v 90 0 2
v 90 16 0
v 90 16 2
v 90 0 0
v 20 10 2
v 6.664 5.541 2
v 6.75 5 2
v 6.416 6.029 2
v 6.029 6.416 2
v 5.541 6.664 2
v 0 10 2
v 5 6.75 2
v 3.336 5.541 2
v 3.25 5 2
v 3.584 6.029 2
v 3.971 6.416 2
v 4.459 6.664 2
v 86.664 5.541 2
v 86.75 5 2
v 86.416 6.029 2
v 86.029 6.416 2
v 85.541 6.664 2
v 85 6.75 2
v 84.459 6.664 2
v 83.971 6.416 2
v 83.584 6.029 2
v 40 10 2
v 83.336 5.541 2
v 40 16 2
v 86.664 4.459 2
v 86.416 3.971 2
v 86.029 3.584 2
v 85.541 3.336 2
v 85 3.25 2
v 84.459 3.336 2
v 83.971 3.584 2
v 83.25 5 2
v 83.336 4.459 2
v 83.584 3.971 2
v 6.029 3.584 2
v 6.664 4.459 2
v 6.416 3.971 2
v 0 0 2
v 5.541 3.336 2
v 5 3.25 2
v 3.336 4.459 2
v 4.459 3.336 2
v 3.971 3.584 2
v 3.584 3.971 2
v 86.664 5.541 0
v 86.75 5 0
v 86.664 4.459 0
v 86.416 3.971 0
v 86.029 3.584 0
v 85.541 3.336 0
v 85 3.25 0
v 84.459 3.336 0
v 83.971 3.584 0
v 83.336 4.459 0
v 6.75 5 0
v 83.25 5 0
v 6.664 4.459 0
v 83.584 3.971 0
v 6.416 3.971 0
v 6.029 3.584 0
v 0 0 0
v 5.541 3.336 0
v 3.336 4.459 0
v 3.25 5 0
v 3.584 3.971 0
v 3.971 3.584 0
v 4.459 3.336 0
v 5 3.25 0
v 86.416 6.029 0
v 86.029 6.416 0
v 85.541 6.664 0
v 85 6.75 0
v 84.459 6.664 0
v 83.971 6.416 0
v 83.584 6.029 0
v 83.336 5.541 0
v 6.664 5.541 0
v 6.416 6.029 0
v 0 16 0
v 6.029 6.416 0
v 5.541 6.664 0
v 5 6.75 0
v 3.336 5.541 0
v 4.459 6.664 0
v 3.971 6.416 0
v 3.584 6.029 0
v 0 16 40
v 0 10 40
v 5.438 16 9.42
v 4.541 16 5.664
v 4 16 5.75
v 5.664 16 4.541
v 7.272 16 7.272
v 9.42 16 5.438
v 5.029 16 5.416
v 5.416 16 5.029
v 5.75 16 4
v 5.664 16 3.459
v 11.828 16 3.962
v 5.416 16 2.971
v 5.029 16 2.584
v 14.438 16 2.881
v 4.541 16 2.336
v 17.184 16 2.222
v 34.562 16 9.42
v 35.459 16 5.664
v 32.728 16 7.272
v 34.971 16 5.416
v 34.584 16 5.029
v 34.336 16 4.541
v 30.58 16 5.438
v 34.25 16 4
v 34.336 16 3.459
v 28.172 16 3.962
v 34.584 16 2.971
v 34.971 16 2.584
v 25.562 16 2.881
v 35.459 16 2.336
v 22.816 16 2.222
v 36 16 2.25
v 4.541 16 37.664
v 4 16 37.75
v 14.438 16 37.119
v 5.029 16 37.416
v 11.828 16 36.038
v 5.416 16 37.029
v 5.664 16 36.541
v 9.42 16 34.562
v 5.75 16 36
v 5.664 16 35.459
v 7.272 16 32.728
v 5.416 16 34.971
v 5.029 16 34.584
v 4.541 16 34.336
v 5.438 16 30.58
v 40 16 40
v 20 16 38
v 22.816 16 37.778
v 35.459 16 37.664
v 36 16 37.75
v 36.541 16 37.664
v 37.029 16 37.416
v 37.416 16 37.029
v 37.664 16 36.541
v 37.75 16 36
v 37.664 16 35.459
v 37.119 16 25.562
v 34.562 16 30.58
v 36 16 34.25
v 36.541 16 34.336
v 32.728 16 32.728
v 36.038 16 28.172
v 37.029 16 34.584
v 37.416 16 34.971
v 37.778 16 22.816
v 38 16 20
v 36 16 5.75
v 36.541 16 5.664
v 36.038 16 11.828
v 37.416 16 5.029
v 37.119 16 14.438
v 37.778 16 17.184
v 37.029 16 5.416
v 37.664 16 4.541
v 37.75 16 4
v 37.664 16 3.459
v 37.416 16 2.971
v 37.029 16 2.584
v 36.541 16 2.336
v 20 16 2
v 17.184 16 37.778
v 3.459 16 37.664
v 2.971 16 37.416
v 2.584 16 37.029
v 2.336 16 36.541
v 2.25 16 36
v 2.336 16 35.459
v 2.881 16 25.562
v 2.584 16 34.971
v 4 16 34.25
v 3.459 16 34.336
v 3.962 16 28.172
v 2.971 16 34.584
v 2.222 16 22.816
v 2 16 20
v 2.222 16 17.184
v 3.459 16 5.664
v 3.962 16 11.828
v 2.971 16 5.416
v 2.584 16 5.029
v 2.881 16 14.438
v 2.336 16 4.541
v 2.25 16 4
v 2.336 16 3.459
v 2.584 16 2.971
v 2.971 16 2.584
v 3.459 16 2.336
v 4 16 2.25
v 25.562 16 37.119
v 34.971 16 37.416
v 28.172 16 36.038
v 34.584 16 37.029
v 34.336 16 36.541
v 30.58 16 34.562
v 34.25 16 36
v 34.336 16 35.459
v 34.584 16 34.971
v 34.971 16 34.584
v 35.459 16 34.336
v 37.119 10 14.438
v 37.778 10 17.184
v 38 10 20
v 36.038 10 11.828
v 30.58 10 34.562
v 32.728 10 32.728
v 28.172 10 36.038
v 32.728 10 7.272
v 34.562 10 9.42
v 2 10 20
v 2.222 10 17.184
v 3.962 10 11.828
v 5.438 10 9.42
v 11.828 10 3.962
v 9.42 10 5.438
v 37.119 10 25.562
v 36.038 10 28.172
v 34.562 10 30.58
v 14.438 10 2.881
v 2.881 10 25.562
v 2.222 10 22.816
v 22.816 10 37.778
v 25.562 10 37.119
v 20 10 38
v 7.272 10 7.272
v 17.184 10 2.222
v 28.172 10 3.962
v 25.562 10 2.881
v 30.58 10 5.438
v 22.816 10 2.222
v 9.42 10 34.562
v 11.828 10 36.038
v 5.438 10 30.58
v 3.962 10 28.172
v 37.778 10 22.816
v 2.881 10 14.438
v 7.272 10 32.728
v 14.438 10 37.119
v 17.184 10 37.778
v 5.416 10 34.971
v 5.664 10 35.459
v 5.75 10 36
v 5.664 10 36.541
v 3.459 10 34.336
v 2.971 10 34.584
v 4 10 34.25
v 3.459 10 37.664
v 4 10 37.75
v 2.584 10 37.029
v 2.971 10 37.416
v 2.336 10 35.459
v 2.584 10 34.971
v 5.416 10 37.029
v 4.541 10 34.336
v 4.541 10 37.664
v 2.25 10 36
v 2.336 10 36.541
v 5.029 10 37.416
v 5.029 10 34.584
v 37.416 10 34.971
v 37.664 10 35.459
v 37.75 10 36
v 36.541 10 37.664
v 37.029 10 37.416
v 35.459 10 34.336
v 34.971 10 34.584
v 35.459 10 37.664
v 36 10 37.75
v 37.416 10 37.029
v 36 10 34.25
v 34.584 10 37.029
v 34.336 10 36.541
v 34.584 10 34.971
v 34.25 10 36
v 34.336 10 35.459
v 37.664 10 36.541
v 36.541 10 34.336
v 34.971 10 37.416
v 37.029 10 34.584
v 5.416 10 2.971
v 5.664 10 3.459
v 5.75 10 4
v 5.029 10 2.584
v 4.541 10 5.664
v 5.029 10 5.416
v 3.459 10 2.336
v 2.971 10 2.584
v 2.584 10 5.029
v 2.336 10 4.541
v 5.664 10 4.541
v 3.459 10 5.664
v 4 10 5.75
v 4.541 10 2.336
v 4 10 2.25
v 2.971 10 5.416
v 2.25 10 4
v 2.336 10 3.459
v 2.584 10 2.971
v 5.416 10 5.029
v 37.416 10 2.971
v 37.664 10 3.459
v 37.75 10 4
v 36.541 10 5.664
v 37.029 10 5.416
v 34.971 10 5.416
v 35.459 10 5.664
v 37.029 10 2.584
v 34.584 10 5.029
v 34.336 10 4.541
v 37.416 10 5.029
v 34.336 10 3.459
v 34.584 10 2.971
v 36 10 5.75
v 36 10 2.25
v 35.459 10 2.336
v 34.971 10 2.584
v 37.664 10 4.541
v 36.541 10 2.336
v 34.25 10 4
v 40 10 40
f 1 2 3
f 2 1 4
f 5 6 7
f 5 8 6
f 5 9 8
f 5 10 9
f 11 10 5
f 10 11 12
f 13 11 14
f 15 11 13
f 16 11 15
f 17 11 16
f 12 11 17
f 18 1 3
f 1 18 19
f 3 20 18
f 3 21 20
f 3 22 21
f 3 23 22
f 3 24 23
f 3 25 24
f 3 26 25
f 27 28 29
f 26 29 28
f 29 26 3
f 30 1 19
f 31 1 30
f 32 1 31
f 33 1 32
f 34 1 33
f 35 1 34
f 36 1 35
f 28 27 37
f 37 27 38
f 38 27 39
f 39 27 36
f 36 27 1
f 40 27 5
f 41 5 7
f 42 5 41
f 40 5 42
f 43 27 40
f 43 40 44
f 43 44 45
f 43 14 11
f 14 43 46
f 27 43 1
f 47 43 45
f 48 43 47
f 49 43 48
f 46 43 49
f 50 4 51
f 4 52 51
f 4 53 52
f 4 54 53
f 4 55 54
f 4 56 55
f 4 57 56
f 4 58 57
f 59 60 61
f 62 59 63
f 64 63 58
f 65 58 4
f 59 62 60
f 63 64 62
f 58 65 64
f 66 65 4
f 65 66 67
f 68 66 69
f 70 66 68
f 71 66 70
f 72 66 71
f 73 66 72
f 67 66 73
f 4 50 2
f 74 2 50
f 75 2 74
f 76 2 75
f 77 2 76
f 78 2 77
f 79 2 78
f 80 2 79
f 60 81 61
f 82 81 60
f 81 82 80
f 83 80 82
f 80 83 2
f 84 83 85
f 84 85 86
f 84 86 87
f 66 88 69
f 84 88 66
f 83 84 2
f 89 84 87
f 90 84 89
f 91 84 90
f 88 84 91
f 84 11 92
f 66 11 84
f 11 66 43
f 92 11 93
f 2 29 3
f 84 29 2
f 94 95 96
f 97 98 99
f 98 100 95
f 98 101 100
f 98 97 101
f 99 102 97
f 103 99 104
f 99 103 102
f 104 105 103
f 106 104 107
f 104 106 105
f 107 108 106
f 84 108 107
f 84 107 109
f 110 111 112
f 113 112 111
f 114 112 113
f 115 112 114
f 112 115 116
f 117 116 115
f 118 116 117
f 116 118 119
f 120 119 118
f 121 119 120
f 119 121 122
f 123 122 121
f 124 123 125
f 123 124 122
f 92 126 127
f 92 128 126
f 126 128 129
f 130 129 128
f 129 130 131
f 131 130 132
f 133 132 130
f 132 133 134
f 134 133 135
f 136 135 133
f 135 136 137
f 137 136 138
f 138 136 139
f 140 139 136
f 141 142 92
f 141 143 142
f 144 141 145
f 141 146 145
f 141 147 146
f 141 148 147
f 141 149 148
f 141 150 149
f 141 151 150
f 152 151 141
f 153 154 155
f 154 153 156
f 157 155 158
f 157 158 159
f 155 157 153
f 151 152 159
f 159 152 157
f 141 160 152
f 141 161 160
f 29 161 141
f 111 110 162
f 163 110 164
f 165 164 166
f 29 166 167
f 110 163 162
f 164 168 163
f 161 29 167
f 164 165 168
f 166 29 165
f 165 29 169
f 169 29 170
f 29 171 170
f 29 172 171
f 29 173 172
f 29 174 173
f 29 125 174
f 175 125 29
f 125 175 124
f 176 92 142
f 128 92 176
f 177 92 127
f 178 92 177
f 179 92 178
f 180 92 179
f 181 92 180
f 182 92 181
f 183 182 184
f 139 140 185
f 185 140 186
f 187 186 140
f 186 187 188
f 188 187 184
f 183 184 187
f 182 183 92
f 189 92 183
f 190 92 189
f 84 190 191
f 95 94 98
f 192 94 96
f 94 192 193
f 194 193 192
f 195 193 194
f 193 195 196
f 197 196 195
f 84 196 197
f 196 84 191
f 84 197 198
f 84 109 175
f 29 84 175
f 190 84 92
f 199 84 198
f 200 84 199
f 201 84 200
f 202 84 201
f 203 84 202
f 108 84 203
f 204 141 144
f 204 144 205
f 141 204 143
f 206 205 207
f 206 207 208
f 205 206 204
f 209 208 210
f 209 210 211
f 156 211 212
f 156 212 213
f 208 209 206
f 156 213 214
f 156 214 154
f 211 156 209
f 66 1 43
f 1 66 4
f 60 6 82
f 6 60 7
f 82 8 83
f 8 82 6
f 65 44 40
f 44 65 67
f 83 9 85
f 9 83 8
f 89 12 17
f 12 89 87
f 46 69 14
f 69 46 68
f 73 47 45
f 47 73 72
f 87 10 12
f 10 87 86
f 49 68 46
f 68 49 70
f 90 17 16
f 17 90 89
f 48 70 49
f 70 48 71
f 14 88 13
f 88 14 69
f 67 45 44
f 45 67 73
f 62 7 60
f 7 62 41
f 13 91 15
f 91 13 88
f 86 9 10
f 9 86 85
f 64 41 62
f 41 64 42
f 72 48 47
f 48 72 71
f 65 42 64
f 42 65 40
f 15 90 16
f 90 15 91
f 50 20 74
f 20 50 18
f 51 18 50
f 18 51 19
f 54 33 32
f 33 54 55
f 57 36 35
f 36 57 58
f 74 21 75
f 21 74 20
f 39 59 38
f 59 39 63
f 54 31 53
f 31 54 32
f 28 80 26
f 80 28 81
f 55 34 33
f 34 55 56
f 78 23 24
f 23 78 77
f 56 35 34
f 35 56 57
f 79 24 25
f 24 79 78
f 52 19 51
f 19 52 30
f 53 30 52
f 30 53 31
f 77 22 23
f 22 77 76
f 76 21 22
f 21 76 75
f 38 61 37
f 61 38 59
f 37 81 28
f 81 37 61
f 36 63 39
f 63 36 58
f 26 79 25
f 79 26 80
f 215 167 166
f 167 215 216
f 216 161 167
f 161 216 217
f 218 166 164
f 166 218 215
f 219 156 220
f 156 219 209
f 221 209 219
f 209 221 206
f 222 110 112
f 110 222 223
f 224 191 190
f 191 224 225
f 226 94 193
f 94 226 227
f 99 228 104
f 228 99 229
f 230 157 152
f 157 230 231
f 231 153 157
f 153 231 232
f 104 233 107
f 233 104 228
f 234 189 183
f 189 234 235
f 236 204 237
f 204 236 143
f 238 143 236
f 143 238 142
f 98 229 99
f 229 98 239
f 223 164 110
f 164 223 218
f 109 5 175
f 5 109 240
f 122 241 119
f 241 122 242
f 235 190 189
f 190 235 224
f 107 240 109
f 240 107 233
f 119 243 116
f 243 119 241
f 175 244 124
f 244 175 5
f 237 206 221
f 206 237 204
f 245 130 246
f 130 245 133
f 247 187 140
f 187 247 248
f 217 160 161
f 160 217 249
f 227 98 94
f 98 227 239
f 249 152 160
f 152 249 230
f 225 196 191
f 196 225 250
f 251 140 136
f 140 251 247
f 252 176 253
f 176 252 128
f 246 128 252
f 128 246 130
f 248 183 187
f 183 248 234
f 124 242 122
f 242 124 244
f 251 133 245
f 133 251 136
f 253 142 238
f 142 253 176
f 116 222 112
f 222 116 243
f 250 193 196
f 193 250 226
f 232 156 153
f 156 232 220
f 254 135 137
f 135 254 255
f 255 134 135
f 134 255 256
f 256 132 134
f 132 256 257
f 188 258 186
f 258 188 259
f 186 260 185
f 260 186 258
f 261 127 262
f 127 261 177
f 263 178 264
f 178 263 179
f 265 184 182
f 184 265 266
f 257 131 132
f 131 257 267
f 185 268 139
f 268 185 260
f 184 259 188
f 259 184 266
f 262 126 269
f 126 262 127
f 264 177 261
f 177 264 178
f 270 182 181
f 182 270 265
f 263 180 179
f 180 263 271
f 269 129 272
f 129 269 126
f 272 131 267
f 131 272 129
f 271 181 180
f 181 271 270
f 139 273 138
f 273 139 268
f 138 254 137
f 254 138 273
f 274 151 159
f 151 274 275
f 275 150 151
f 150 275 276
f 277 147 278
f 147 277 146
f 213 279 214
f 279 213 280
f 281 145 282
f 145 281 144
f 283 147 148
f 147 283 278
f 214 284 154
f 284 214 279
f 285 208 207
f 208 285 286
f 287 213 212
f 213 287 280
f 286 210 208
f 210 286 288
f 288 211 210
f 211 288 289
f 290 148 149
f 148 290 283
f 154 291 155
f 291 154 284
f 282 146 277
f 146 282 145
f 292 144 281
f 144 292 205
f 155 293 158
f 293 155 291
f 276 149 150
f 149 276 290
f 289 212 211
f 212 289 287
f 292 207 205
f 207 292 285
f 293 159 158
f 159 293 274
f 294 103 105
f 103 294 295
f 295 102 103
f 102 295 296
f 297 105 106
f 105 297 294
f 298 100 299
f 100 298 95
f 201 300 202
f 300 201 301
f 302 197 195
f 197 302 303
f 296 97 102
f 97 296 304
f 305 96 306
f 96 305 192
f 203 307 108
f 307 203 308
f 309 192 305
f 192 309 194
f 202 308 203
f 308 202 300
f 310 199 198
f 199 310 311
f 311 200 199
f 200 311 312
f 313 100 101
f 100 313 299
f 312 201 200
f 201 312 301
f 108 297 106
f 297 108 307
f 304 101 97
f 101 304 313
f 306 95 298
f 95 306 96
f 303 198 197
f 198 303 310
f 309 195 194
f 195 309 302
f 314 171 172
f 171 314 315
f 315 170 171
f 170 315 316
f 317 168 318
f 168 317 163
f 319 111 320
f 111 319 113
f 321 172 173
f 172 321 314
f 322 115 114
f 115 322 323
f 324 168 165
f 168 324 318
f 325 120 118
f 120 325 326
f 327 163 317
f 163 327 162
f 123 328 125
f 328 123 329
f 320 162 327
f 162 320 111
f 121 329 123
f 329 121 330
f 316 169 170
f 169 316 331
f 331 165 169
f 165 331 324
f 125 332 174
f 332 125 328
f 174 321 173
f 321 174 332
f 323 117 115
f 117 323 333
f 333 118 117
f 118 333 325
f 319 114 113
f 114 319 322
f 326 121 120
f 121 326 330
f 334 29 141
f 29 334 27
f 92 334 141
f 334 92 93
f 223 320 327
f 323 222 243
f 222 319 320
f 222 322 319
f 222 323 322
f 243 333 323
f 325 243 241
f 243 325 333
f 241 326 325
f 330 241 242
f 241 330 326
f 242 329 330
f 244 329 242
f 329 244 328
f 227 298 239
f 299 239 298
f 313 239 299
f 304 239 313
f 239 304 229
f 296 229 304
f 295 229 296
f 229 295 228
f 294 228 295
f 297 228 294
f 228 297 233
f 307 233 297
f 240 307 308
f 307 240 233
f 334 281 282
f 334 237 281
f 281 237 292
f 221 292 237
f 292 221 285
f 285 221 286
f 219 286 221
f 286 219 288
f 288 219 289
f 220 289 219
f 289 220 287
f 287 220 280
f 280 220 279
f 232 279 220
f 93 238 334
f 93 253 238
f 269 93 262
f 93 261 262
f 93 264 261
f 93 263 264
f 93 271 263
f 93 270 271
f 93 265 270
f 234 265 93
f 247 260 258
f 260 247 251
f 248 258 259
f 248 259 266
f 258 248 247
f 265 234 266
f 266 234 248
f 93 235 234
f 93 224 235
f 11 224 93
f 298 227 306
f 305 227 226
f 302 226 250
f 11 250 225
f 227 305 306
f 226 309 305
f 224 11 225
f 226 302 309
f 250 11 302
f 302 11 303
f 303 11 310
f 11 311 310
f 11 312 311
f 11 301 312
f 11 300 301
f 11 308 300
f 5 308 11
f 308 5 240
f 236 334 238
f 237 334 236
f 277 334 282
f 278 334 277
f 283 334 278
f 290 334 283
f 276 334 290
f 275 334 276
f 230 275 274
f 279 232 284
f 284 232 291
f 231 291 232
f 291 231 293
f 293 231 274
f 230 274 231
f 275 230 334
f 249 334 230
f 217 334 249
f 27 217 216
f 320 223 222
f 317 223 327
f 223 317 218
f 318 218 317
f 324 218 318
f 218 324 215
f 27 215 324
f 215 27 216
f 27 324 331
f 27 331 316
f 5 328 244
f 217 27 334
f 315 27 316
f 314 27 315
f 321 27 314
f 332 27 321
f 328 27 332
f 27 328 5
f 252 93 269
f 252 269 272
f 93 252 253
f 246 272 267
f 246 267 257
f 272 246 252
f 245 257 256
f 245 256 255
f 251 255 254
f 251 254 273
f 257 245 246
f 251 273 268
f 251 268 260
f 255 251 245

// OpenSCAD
difference(){
  cube([90,16,2]);
  translate([5,5,-.01]) cylinder(d=3.5,h=3,$fn=20);
  translate([85,5,-.01]) cylinder(d=3.5,h=3,$fn=20);
}
translate([0,10]) {
  difference(){
    cube([40,6,40]);
    translate([20,-.01,20]) rotate([-90,0]) {
      cylinder(d=36,h=11,$fn=40);
      translate([-16,-16]) cylinder(d=3.5,h=11,$fn=20);
      translate([16,-16]) cylinder(d=3.5,h=11,$fn=20);
      translate([-16,16]) cylinder(d=3.5,h=11,$fn=20);
      translate([16,16]) cylinder(d=3.5,h=11,$fn=20);
    }
  }
}
